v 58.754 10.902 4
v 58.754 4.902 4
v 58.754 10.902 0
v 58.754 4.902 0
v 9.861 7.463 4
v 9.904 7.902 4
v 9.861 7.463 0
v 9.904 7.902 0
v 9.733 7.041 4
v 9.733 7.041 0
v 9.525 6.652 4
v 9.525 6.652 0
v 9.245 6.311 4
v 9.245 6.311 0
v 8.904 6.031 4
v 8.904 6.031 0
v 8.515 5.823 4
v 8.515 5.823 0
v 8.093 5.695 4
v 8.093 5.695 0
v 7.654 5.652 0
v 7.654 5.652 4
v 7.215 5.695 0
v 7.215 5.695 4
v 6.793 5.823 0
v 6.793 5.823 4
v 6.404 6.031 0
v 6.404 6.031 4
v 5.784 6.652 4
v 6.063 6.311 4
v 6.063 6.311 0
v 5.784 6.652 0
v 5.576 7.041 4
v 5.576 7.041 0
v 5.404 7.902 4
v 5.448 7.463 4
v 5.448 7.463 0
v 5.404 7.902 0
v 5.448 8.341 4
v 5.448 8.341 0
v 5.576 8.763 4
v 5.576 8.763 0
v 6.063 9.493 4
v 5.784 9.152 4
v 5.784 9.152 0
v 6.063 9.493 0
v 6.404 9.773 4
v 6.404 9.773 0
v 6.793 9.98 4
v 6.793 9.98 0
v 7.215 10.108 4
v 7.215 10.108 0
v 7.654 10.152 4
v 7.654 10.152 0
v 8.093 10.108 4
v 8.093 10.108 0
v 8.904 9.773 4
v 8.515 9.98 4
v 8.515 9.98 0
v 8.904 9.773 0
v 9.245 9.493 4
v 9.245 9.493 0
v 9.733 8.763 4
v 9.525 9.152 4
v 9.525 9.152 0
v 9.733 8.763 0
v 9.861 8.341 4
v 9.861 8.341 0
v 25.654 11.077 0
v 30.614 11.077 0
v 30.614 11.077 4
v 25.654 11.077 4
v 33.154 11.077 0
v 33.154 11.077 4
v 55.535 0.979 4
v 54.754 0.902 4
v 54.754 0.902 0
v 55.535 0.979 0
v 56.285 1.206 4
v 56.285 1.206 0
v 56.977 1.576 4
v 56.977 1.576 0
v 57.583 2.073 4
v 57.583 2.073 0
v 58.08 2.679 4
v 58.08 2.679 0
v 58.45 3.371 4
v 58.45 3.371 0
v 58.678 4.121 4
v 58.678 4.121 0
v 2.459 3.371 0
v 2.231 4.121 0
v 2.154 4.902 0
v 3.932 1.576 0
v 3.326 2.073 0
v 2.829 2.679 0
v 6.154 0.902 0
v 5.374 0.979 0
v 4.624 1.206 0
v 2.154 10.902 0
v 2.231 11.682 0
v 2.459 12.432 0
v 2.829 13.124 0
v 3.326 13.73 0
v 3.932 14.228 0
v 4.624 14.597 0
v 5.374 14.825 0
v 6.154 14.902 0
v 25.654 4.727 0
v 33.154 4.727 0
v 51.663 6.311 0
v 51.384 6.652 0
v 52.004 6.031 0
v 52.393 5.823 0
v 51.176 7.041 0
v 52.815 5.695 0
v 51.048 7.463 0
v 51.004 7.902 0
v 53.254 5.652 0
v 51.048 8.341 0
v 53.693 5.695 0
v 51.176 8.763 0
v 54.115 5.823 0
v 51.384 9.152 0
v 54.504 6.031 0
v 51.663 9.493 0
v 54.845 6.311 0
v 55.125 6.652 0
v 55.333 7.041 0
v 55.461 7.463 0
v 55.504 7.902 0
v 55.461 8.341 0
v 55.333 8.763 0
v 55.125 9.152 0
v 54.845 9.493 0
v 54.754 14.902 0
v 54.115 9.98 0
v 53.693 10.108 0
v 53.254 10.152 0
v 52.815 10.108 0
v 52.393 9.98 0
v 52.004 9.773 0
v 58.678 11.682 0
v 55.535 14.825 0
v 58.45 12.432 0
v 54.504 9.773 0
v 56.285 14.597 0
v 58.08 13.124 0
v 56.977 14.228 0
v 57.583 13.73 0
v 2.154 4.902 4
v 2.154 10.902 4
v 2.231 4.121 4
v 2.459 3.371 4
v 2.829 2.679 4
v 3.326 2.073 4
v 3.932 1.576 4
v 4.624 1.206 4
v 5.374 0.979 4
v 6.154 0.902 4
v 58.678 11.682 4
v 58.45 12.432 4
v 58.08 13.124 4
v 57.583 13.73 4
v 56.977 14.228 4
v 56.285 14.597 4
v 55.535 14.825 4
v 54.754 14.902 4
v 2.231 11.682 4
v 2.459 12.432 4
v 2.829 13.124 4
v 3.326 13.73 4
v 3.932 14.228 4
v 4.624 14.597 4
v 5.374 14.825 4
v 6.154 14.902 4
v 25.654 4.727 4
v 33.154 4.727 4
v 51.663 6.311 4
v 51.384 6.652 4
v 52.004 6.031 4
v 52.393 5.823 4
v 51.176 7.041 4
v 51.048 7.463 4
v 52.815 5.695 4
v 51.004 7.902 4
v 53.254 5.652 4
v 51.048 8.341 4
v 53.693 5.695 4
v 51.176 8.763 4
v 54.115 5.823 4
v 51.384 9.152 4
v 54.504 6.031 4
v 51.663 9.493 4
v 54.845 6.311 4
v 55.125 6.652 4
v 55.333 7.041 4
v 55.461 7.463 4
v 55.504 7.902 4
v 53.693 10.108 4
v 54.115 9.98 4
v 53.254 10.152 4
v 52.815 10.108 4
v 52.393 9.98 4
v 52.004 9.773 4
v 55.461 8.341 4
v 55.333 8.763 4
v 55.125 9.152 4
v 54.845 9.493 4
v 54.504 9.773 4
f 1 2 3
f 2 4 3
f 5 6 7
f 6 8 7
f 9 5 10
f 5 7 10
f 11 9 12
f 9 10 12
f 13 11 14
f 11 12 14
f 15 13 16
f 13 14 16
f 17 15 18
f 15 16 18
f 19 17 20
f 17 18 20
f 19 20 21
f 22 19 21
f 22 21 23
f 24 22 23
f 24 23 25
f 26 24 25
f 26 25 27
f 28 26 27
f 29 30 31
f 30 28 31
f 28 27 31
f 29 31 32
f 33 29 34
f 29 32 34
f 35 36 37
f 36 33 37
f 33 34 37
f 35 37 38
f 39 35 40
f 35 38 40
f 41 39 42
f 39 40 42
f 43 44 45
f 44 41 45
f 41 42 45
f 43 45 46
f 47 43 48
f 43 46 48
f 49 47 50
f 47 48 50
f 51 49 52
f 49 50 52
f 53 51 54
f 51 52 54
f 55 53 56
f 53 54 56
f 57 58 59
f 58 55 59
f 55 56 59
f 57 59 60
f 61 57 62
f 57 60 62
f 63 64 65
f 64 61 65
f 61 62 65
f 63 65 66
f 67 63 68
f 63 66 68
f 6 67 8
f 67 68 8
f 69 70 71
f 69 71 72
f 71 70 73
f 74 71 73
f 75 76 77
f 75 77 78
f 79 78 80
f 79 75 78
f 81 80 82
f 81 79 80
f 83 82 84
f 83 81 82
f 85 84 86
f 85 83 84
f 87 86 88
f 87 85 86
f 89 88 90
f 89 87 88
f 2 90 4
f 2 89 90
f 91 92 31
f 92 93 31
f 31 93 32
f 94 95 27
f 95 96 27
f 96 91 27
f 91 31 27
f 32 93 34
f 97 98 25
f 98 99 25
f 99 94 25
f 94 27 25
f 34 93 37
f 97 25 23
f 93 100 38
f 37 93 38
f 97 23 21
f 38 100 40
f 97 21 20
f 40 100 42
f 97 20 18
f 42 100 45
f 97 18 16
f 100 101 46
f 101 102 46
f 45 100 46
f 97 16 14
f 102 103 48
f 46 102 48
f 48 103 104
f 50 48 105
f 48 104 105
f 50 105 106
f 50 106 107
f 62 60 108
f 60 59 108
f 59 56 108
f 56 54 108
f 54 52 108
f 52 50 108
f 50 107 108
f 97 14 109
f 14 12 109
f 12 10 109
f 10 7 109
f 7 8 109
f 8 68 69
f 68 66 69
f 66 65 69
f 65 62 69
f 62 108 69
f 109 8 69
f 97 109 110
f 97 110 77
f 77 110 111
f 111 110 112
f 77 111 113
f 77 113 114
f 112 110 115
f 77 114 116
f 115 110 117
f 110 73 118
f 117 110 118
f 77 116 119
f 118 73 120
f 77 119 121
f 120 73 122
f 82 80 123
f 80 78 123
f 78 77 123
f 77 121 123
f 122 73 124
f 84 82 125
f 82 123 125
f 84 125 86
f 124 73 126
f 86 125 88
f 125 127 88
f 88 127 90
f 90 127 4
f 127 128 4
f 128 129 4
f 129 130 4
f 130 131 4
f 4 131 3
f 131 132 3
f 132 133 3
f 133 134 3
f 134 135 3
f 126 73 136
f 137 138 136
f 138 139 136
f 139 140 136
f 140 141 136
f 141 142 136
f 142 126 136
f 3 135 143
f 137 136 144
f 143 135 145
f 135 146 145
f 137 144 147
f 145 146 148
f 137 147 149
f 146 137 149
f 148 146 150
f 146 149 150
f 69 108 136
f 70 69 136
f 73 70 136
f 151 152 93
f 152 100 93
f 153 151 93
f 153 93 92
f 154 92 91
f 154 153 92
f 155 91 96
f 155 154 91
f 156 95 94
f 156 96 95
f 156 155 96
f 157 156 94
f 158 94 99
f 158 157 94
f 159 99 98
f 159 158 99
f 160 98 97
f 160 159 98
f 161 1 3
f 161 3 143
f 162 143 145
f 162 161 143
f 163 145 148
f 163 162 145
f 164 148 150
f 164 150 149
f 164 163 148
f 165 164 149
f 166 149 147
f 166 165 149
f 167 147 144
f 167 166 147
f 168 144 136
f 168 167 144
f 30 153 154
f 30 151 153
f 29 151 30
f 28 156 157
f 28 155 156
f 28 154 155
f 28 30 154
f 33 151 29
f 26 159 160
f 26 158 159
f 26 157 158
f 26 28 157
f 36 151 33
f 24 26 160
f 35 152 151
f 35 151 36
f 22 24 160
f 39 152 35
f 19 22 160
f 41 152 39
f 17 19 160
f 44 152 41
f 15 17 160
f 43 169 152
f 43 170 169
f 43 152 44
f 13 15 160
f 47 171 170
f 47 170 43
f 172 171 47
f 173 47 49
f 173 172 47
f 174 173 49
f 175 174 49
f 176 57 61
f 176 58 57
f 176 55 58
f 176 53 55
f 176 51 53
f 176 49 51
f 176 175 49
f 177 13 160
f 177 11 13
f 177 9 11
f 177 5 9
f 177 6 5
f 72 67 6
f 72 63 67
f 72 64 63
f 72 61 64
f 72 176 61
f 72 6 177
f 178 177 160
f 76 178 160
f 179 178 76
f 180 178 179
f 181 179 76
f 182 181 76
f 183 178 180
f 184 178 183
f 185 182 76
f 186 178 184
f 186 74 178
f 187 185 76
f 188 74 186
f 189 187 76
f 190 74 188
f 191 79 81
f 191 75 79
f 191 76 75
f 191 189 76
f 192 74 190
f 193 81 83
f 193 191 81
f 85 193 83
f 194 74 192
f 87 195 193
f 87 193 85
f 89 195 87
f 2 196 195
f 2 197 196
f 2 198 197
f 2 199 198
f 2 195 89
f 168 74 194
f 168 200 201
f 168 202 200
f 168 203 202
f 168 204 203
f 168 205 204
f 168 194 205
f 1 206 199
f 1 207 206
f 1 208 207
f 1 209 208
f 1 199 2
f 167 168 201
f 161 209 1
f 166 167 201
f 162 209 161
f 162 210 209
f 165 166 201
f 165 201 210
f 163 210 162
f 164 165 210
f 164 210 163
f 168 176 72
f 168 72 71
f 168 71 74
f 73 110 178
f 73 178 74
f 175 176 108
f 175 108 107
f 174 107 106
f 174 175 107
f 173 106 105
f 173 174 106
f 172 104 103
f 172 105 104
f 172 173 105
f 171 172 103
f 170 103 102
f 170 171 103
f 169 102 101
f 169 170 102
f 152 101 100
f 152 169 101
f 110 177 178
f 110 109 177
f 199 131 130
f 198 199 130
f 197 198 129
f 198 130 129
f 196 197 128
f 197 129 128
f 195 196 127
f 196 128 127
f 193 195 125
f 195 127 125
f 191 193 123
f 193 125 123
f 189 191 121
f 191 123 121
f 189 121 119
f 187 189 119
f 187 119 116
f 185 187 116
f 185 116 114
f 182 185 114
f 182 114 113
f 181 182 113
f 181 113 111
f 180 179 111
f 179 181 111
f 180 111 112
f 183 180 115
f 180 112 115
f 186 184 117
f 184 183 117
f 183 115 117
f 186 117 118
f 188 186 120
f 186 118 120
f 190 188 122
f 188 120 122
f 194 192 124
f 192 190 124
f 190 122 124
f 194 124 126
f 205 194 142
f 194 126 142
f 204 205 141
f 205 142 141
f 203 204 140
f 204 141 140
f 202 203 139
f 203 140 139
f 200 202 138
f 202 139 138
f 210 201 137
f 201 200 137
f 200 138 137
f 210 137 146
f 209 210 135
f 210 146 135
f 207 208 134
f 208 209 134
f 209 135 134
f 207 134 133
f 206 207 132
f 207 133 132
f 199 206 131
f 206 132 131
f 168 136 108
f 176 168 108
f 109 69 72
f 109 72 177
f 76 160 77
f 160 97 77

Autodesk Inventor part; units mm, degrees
ref_plane "YZ Plane" through (0, 0, 0) normal (1, 0, 0) x (0, 1, 0)
ref_plane "XZ Plane" through (0, 0, 0) normal (0, 1, 0) x (-1, 0, 0)
ref_plane "XY Plane" through (0, 0, 0) normal (0, 0, 1) x (1, 0, 0)
sketch "Náčrt1" plane through (0, 0, 0) normal (0, 0, 1) x (1, 0, 0)
  line L0 (30.6144, 11.0767) -> (33.1544, 11.0767)
  line L1 (33.1544, 11.0767) -> (25.6544, 11.0767)
  line L2 (25.6544, 11.0767) -> (25.6544, 4.7267)
  line L3 (25.6544, 4.7267) -> (33.1544, 4.7267)
  line L4 (33.1544, 4.7267) -> (33.1544, 11.0767)
  line L5 (58.7544, 14.9017) -> (2.1544, 14.9017)
  circle A0 centre (7.6544, 7.9017) radius 2.25
  line L6 (2.1544, 14.9017) -> (2.1544, 0.9017)
  circle A1 centre (53.2544, 7.9017) radius 2.25
  line L7 (2.1544, 0.9017) -> (58.7544, 0.9017)
  line L8 (58.7544, 0.9017) -> (58.7544, 14.9017)
  point P0 (33.1544, 4.7267)
  point P1 (7.6544, 7.9017)
  point P2 (53.2544, 7.9017)
  dimension "d2" = 7.5
  dimension "d3" = 6.35
extrude "Vysunutí1" add sketch "Náčrt1" along normal blind 4
fillet "Zaoblení1" radius 4 4 edges at (58.7544, 0.9017, 2) (58.7544, 14.9017, 2) (2.1544, 14.9017, 2) (2.1544, 0.9017, 2)
properties part number "Spojovaci_clen"
